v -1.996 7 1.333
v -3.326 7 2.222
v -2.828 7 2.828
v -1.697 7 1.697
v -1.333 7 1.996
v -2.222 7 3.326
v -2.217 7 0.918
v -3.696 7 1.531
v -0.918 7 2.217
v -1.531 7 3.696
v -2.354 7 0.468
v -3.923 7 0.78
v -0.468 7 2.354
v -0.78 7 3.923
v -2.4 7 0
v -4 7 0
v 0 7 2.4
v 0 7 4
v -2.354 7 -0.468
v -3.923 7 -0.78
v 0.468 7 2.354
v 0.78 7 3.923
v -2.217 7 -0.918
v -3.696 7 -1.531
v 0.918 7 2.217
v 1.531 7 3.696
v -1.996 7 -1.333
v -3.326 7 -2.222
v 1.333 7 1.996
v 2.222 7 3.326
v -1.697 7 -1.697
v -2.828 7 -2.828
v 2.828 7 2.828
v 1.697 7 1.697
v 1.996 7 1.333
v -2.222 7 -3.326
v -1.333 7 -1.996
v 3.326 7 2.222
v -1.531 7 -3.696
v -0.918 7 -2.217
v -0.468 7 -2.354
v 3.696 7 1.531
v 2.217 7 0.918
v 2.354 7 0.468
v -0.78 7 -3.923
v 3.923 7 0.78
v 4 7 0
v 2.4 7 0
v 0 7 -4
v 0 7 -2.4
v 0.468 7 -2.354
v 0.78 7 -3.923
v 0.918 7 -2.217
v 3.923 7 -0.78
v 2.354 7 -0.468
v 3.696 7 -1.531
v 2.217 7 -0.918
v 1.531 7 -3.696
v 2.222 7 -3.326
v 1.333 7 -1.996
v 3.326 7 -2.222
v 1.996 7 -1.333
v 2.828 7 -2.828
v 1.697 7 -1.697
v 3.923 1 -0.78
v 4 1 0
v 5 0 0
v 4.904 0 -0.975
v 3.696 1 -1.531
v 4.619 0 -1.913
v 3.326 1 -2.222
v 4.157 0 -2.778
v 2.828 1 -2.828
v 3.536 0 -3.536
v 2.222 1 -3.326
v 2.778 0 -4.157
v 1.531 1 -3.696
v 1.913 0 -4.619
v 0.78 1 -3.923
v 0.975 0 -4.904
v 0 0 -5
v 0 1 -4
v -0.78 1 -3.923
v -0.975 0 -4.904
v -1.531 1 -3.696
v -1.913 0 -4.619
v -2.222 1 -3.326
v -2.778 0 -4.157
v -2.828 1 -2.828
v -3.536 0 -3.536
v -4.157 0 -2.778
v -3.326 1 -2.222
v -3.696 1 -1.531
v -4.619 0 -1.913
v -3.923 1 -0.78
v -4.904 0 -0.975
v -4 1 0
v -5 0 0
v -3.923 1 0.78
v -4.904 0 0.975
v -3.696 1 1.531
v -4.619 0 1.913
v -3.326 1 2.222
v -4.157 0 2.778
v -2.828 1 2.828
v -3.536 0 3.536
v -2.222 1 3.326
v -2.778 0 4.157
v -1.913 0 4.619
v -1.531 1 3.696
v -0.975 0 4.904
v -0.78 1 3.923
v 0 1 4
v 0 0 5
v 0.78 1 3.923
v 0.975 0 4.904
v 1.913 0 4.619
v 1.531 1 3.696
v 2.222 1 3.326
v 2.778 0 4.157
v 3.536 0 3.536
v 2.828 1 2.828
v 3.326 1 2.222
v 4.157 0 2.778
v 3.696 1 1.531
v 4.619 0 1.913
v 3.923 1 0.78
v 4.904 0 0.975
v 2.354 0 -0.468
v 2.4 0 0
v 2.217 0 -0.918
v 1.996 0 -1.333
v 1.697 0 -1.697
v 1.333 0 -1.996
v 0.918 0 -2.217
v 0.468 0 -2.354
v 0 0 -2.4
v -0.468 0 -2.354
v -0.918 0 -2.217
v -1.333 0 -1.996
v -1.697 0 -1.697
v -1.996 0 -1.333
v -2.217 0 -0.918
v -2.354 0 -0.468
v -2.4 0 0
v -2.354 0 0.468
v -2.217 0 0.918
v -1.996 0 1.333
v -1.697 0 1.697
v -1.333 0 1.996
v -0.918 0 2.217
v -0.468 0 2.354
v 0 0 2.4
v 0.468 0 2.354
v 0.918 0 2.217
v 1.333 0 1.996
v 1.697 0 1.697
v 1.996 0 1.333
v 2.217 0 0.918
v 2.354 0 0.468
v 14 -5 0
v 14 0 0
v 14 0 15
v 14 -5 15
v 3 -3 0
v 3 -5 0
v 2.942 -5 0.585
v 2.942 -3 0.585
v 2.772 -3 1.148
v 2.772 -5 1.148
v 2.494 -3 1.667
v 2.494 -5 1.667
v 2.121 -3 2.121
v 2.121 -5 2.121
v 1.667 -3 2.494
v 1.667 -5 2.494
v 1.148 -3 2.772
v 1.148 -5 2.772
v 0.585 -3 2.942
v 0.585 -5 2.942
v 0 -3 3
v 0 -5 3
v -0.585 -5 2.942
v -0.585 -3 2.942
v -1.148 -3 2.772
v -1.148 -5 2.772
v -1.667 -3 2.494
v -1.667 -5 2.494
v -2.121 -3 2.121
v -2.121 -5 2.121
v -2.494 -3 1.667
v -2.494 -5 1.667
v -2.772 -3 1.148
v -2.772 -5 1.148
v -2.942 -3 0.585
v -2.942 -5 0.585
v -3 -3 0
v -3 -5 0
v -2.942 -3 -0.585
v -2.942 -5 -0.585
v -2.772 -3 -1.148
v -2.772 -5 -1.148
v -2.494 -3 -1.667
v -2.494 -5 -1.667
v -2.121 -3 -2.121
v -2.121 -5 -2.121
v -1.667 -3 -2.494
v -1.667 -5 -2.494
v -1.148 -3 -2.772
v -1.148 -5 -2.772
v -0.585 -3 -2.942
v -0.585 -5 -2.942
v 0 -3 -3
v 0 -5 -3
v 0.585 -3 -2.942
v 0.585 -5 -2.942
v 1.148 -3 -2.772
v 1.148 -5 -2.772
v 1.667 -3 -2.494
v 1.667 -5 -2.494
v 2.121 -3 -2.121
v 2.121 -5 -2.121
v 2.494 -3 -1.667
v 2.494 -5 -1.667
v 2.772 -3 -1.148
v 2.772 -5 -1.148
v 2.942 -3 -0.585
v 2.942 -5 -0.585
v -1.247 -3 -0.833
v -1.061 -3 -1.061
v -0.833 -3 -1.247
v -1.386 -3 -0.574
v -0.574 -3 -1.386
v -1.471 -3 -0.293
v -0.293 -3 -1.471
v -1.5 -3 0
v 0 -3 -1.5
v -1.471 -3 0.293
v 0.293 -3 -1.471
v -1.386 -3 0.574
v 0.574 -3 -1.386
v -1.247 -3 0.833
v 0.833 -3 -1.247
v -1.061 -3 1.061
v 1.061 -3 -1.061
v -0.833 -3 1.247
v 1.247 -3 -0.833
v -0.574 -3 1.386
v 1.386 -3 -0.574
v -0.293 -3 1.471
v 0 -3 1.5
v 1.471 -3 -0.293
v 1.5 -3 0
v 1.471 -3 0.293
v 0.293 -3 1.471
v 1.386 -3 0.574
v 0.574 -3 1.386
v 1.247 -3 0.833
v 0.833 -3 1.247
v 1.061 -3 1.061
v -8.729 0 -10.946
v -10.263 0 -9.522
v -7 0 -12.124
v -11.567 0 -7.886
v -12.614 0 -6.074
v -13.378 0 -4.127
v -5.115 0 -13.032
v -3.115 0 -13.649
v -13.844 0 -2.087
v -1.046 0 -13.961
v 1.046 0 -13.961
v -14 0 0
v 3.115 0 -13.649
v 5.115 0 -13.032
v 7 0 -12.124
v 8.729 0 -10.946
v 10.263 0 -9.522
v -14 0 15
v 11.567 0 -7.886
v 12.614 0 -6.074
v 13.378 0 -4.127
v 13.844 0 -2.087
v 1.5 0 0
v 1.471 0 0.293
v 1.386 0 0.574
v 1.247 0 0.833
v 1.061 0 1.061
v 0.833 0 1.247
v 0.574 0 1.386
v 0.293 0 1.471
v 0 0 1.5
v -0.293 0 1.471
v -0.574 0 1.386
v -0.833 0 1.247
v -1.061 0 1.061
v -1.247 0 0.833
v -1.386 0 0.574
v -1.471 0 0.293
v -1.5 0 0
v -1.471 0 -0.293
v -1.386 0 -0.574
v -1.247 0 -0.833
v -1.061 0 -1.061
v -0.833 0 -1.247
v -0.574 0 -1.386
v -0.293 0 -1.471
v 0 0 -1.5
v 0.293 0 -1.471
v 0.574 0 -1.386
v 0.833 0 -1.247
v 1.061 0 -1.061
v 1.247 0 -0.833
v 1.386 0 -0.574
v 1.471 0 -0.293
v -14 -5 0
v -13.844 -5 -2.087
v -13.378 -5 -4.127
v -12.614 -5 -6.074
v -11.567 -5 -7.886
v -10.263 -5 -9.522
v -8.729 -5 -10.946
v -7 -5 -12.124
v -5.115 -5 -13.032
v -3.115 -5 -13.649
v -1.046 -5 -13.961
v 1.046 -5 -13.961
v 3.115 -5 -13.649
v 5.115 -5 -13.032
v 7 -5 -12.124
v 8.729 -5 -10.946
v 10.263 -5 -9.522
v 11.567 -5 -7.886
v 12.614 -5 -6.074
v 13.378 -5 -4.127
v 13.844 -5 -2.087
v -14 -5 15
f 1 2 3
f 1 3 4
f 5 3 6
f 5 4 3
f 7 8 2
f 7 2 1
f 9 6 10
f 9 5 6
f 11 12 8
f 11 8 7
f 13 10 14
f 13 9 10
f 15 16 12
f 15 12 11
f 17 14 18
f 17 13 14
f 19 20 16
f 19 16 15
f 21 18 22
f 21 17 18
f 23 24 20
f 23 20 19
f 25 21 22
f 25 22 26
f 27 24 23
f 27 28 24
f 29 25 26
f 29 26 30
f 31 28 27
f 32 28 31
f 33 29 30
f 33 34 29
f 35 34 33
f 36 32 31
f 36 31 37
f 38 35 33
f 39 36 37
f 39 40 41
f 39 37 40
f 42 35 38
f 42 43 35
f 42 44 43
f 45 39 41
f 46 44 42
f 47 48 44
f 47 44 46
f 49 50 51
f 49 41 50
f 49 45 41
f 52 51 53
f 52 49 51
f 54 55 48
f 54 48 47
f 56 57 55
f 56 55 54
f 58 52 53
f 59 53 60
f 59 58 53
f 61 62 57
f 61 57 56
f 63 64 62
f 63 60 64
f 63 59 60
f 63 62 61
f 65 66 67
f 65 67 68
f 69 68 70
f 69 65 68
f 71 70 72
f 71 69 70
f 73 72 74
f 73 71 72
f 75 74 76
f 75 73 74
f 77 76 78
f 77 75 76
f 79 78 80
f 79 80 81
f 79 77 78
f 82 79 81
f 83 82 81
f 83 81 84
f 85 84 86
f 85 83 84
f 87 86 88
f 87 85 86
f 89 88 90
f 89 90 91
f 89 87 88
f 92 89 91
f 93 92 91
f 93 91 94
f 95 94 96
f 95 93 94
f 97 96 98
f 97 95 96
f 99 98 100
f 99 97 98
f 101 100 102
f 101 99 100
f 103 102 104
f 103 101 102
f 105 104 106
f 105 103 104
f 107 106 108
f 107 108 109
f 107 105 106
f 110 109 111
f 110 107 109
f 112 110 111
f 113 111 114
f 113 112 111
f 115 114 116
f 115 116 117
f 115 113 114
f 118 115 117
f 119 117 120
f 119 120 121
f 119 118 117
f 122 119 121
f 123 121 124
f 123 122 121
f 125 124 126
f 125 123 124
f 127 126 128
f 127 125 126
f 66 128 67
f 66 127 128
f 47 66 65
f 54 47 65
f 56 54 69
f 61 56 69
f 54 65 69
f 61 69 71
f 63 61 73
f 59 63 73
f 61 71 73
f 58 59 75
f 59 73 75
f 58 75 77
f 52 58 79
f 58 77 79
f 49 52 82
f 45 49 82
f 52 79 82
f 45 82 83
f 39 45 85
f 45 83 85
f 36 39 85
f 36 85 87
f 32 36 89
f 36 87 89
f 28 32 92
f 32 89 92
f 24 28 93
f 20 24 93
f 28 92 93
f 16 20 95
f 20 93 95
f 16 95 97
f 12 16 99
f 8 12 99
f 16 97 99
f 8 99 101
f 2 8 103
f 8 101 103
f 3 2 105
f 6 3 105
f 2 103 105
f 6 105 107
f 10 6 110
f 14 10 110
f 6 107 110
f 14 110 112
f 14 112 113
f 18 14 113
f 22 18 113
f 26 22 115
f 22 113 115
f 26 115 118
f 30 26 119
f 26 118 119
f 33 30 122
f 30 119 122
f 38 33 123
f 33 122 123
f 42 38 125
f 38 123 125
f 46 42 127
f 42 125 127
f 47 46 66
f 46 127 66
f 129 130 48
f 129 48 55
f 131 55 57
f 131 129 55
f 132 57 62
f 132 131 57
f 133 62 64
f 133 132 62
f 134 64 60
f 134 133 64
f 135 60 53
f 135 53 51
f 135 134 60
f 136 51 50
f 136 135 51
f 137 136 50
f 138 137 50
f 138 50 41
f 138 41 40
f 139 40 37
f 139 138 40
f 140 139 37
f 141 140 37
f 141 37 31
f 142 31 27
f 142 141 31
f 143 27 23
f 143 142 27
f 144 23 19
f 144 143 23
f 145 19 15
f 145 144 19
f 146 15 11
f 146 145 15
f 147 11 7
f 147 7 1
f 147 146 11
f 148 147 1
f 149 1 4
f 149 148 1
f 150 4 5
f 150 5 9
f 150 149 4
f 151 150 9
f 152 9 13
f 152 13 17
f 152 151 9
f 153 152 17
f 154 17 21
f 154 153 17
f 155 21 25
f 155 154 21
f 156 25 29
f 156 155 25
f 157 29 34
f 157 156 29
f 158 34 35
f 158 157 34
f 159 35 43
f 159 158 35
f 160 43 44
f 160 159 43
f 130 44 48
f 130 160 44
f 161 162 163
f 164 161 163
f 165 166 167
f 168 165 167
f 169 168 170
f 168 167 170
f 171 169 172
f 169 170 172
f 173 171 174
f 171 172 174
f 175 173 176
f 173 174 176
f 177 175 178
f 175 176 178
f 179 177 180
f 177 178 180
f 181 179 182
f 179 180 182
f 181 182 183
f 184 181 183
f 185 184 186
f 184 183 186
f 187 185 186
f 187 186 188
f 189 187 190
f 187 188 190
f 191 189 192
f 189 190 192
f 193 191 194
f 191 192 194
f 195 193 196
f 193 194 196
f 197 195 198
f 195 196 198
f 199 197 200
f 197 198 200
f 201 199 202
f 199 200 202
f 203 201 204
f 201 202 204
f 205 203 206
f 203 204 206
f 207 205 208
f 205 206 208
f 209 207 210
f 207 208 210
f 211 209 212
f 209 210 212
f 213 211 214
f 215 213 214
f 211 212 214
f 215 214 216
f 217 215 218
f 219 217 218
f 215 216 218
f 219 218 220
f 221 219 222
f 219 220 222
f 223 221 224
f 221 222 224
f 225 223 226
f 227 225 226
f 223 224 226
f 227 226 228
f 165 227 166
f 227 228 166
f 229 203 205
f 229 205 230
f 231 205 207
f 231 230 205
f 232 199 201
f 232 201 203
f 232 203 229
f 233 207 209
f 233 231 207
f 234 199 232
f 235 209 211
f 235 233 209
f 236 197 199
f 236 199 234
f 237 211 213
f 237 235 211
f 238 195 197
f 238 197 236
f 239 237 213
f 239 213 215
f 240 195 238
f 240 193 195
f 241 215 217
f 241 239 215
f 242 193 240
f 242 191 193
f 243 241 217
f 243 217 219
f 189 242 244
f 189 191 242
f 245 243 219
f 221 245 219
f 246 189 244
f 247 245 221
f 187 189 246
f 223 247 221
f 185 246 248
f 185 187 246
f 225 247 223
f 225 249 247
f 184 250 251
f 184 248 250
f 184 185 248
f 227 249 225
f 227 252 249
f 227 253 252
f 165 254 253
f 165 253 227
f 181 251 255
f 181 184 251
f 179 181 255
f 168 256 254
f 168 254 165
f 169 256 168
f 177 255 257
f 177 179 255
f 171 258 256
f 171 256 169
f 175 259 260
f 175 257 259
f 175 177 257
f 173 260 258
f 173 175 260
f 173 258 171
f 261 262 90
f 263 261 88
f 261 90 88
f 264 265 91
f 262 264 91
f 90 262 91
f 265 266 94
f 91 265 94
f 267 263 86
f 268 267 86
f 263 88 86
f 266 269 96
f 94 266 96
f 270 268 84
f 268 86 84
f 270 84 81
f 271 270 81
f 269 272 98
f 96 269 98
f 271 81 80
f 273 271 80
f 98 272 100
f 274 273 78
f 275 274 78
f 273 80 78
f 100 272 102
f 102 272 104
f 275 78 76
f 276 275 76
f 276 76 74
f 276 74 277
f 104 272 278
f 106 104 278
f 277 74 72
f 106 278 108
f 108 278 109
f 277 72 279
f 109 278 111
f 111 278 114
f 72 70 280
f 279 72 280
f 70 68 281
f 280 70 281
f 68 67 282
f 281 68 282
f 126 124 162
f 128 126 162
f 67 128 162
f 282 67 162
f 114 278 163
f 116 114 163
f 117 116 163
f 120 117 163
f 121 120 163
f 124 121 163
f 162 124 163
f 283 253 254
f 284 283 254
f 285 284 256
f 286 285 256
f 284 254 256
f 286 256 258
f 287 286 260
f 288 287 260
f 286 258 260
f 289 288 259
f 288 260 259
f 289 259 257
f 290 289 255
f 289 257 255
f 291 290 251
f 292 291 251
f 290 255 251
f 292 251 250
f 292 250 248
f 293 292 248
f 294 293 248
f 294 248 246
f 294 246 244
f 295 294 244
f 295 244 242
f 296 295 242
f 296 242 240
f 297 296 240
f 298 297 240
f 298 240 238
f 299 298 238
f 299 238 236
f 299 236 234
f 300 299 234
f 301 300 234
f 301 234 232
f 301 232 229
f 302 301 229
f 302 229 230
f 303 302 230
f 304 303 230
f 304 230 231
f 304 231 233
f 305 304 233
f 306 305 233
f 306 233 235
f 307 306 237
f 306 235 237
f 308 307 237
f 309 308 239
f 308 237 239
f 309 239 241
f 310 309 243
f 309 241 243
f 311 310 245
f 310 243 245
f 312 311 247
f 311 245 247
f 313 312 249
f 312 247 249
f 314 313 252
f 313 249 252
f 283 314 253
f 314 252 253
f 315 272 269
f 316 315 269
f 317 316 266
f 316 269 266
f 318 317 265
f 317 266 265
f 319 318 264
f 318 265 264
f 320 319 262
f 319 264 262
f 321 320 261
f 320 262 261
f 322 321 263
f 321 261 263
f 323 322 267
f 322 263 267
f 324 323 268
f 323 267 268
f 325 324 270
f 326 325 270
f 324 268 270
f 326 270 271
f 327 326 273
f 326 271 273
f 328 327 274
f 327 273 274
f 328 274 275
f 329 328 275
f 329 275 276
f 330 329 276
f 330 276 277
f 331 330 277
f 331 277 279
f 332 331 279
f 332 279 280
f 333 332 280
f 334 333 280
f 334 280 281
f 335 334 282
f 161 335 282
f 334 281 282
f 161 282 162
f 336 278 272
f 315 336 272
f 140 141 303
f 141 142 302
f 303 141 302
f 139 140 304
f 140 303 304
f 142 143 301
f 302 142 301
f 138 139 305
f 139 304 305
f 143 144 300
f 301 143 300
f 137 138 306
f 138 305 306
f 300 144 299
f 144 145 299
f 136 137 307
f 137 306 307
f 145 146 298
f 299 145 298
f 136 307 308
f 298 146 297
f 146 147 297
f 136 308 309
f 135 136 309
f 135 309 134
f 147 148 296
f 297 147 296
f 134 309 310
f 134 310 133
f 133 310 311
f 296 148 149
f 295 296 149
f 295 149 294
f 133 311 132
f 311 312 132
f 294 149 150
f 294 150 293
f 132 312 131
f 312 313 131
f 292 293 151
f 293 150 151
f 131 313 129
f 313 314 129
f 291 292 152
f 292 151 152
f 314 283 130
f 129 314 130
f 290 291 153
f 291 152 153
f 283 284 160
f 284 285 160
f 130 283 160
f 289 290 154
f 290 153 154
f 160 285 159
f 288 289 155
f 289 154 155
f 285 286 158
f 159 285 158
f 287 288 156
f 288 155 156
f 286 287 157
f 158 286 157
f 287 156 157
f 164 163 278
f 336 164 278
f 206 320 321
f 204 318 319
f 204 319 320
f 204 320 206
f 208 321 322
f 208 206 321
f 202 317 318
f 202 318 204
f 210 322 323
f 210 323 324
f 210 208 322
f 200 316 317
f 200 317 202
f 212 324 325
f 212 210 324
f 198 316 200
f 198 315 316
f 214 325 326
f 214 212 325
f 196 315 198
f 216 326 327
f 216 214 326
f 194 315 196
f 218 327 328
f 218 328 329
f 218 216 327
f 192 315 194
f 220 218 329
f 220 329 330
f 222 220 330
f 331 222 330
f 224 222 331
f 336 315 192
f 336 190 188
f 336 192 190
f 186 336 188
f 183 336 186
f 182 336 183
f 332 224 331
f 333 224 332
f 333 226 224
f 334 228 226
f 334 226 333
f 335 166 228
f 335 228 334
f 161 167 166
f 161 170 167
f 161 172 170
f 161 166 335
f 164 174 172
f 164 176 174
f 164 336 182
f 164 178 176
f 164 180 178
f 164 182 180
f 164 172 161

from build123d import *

# Parameters (mm, degrees)
PAD_DEPTH       = 5
SKETCH001_R     = 4
SKETCH001_R_2   = 2.4
PAD001_DEPTH    = 7
SKETCH002_R     = 1.5
POCKET_DEPTH    = 12.001
SKETCH003_R     = 3
POCKET001_DEPTH = 2
CHAMFER_SIZE    = 1


with BuildPart() as part:
    # Sketch → Pad (new body)
    with BuildSketch(Plane.XZ):
        with BuildLine():
            Line((-14, 15), (-14, 0))
            ThreePointArc((-14, 0), (0, -14), (14, 0))
            Line((14, 0), (14, 15))
            Line((14, 15), (-14, 15))
        make_face()
    extrude(amount=PAD_DEPTH)

    # Sketch001 (on Face5 of Pad) → Pad001 (join)
    with BuildSketch(Plane(origin=(0, 0, 0), x_dir=(1, 0, 0), z_dir=(0, 1, 0))):
        Circle(SKETCH001_R)
        Circle(SKETCH001_R_2, mode=Mode.SUBTRACT)
    extrude(amount=PAD001_DEPTH)

    # Sketch002 (on Face5 of Pad001) → Pocket (cut, through all)
    with BuildSketch(Plane.XZ.offset(5)):
        Circle(SKETCH002_R)
    extrude(amount=-POCKET_DEPTH, mode=Mode.SUBTRACT)

    # Sketch003 (on Face5 of Pocket) → Pocket001 (cut)
    with BuildSketch(Plane.XZ.offset(5)):
        Circle(SKETCH003_R)
    extrude(amount=-POCKET001_DEPTH, mode=Mode.SUBTRACT)

    # Chamfer
    chamfer_edges = [part.edges().sort_by_distance(p)[0] for p in [
        (-4, 0, 0),
    ]]
    chamfer(chamfer_edges, length=CHAMFER_SIZE)


solid = part.part
